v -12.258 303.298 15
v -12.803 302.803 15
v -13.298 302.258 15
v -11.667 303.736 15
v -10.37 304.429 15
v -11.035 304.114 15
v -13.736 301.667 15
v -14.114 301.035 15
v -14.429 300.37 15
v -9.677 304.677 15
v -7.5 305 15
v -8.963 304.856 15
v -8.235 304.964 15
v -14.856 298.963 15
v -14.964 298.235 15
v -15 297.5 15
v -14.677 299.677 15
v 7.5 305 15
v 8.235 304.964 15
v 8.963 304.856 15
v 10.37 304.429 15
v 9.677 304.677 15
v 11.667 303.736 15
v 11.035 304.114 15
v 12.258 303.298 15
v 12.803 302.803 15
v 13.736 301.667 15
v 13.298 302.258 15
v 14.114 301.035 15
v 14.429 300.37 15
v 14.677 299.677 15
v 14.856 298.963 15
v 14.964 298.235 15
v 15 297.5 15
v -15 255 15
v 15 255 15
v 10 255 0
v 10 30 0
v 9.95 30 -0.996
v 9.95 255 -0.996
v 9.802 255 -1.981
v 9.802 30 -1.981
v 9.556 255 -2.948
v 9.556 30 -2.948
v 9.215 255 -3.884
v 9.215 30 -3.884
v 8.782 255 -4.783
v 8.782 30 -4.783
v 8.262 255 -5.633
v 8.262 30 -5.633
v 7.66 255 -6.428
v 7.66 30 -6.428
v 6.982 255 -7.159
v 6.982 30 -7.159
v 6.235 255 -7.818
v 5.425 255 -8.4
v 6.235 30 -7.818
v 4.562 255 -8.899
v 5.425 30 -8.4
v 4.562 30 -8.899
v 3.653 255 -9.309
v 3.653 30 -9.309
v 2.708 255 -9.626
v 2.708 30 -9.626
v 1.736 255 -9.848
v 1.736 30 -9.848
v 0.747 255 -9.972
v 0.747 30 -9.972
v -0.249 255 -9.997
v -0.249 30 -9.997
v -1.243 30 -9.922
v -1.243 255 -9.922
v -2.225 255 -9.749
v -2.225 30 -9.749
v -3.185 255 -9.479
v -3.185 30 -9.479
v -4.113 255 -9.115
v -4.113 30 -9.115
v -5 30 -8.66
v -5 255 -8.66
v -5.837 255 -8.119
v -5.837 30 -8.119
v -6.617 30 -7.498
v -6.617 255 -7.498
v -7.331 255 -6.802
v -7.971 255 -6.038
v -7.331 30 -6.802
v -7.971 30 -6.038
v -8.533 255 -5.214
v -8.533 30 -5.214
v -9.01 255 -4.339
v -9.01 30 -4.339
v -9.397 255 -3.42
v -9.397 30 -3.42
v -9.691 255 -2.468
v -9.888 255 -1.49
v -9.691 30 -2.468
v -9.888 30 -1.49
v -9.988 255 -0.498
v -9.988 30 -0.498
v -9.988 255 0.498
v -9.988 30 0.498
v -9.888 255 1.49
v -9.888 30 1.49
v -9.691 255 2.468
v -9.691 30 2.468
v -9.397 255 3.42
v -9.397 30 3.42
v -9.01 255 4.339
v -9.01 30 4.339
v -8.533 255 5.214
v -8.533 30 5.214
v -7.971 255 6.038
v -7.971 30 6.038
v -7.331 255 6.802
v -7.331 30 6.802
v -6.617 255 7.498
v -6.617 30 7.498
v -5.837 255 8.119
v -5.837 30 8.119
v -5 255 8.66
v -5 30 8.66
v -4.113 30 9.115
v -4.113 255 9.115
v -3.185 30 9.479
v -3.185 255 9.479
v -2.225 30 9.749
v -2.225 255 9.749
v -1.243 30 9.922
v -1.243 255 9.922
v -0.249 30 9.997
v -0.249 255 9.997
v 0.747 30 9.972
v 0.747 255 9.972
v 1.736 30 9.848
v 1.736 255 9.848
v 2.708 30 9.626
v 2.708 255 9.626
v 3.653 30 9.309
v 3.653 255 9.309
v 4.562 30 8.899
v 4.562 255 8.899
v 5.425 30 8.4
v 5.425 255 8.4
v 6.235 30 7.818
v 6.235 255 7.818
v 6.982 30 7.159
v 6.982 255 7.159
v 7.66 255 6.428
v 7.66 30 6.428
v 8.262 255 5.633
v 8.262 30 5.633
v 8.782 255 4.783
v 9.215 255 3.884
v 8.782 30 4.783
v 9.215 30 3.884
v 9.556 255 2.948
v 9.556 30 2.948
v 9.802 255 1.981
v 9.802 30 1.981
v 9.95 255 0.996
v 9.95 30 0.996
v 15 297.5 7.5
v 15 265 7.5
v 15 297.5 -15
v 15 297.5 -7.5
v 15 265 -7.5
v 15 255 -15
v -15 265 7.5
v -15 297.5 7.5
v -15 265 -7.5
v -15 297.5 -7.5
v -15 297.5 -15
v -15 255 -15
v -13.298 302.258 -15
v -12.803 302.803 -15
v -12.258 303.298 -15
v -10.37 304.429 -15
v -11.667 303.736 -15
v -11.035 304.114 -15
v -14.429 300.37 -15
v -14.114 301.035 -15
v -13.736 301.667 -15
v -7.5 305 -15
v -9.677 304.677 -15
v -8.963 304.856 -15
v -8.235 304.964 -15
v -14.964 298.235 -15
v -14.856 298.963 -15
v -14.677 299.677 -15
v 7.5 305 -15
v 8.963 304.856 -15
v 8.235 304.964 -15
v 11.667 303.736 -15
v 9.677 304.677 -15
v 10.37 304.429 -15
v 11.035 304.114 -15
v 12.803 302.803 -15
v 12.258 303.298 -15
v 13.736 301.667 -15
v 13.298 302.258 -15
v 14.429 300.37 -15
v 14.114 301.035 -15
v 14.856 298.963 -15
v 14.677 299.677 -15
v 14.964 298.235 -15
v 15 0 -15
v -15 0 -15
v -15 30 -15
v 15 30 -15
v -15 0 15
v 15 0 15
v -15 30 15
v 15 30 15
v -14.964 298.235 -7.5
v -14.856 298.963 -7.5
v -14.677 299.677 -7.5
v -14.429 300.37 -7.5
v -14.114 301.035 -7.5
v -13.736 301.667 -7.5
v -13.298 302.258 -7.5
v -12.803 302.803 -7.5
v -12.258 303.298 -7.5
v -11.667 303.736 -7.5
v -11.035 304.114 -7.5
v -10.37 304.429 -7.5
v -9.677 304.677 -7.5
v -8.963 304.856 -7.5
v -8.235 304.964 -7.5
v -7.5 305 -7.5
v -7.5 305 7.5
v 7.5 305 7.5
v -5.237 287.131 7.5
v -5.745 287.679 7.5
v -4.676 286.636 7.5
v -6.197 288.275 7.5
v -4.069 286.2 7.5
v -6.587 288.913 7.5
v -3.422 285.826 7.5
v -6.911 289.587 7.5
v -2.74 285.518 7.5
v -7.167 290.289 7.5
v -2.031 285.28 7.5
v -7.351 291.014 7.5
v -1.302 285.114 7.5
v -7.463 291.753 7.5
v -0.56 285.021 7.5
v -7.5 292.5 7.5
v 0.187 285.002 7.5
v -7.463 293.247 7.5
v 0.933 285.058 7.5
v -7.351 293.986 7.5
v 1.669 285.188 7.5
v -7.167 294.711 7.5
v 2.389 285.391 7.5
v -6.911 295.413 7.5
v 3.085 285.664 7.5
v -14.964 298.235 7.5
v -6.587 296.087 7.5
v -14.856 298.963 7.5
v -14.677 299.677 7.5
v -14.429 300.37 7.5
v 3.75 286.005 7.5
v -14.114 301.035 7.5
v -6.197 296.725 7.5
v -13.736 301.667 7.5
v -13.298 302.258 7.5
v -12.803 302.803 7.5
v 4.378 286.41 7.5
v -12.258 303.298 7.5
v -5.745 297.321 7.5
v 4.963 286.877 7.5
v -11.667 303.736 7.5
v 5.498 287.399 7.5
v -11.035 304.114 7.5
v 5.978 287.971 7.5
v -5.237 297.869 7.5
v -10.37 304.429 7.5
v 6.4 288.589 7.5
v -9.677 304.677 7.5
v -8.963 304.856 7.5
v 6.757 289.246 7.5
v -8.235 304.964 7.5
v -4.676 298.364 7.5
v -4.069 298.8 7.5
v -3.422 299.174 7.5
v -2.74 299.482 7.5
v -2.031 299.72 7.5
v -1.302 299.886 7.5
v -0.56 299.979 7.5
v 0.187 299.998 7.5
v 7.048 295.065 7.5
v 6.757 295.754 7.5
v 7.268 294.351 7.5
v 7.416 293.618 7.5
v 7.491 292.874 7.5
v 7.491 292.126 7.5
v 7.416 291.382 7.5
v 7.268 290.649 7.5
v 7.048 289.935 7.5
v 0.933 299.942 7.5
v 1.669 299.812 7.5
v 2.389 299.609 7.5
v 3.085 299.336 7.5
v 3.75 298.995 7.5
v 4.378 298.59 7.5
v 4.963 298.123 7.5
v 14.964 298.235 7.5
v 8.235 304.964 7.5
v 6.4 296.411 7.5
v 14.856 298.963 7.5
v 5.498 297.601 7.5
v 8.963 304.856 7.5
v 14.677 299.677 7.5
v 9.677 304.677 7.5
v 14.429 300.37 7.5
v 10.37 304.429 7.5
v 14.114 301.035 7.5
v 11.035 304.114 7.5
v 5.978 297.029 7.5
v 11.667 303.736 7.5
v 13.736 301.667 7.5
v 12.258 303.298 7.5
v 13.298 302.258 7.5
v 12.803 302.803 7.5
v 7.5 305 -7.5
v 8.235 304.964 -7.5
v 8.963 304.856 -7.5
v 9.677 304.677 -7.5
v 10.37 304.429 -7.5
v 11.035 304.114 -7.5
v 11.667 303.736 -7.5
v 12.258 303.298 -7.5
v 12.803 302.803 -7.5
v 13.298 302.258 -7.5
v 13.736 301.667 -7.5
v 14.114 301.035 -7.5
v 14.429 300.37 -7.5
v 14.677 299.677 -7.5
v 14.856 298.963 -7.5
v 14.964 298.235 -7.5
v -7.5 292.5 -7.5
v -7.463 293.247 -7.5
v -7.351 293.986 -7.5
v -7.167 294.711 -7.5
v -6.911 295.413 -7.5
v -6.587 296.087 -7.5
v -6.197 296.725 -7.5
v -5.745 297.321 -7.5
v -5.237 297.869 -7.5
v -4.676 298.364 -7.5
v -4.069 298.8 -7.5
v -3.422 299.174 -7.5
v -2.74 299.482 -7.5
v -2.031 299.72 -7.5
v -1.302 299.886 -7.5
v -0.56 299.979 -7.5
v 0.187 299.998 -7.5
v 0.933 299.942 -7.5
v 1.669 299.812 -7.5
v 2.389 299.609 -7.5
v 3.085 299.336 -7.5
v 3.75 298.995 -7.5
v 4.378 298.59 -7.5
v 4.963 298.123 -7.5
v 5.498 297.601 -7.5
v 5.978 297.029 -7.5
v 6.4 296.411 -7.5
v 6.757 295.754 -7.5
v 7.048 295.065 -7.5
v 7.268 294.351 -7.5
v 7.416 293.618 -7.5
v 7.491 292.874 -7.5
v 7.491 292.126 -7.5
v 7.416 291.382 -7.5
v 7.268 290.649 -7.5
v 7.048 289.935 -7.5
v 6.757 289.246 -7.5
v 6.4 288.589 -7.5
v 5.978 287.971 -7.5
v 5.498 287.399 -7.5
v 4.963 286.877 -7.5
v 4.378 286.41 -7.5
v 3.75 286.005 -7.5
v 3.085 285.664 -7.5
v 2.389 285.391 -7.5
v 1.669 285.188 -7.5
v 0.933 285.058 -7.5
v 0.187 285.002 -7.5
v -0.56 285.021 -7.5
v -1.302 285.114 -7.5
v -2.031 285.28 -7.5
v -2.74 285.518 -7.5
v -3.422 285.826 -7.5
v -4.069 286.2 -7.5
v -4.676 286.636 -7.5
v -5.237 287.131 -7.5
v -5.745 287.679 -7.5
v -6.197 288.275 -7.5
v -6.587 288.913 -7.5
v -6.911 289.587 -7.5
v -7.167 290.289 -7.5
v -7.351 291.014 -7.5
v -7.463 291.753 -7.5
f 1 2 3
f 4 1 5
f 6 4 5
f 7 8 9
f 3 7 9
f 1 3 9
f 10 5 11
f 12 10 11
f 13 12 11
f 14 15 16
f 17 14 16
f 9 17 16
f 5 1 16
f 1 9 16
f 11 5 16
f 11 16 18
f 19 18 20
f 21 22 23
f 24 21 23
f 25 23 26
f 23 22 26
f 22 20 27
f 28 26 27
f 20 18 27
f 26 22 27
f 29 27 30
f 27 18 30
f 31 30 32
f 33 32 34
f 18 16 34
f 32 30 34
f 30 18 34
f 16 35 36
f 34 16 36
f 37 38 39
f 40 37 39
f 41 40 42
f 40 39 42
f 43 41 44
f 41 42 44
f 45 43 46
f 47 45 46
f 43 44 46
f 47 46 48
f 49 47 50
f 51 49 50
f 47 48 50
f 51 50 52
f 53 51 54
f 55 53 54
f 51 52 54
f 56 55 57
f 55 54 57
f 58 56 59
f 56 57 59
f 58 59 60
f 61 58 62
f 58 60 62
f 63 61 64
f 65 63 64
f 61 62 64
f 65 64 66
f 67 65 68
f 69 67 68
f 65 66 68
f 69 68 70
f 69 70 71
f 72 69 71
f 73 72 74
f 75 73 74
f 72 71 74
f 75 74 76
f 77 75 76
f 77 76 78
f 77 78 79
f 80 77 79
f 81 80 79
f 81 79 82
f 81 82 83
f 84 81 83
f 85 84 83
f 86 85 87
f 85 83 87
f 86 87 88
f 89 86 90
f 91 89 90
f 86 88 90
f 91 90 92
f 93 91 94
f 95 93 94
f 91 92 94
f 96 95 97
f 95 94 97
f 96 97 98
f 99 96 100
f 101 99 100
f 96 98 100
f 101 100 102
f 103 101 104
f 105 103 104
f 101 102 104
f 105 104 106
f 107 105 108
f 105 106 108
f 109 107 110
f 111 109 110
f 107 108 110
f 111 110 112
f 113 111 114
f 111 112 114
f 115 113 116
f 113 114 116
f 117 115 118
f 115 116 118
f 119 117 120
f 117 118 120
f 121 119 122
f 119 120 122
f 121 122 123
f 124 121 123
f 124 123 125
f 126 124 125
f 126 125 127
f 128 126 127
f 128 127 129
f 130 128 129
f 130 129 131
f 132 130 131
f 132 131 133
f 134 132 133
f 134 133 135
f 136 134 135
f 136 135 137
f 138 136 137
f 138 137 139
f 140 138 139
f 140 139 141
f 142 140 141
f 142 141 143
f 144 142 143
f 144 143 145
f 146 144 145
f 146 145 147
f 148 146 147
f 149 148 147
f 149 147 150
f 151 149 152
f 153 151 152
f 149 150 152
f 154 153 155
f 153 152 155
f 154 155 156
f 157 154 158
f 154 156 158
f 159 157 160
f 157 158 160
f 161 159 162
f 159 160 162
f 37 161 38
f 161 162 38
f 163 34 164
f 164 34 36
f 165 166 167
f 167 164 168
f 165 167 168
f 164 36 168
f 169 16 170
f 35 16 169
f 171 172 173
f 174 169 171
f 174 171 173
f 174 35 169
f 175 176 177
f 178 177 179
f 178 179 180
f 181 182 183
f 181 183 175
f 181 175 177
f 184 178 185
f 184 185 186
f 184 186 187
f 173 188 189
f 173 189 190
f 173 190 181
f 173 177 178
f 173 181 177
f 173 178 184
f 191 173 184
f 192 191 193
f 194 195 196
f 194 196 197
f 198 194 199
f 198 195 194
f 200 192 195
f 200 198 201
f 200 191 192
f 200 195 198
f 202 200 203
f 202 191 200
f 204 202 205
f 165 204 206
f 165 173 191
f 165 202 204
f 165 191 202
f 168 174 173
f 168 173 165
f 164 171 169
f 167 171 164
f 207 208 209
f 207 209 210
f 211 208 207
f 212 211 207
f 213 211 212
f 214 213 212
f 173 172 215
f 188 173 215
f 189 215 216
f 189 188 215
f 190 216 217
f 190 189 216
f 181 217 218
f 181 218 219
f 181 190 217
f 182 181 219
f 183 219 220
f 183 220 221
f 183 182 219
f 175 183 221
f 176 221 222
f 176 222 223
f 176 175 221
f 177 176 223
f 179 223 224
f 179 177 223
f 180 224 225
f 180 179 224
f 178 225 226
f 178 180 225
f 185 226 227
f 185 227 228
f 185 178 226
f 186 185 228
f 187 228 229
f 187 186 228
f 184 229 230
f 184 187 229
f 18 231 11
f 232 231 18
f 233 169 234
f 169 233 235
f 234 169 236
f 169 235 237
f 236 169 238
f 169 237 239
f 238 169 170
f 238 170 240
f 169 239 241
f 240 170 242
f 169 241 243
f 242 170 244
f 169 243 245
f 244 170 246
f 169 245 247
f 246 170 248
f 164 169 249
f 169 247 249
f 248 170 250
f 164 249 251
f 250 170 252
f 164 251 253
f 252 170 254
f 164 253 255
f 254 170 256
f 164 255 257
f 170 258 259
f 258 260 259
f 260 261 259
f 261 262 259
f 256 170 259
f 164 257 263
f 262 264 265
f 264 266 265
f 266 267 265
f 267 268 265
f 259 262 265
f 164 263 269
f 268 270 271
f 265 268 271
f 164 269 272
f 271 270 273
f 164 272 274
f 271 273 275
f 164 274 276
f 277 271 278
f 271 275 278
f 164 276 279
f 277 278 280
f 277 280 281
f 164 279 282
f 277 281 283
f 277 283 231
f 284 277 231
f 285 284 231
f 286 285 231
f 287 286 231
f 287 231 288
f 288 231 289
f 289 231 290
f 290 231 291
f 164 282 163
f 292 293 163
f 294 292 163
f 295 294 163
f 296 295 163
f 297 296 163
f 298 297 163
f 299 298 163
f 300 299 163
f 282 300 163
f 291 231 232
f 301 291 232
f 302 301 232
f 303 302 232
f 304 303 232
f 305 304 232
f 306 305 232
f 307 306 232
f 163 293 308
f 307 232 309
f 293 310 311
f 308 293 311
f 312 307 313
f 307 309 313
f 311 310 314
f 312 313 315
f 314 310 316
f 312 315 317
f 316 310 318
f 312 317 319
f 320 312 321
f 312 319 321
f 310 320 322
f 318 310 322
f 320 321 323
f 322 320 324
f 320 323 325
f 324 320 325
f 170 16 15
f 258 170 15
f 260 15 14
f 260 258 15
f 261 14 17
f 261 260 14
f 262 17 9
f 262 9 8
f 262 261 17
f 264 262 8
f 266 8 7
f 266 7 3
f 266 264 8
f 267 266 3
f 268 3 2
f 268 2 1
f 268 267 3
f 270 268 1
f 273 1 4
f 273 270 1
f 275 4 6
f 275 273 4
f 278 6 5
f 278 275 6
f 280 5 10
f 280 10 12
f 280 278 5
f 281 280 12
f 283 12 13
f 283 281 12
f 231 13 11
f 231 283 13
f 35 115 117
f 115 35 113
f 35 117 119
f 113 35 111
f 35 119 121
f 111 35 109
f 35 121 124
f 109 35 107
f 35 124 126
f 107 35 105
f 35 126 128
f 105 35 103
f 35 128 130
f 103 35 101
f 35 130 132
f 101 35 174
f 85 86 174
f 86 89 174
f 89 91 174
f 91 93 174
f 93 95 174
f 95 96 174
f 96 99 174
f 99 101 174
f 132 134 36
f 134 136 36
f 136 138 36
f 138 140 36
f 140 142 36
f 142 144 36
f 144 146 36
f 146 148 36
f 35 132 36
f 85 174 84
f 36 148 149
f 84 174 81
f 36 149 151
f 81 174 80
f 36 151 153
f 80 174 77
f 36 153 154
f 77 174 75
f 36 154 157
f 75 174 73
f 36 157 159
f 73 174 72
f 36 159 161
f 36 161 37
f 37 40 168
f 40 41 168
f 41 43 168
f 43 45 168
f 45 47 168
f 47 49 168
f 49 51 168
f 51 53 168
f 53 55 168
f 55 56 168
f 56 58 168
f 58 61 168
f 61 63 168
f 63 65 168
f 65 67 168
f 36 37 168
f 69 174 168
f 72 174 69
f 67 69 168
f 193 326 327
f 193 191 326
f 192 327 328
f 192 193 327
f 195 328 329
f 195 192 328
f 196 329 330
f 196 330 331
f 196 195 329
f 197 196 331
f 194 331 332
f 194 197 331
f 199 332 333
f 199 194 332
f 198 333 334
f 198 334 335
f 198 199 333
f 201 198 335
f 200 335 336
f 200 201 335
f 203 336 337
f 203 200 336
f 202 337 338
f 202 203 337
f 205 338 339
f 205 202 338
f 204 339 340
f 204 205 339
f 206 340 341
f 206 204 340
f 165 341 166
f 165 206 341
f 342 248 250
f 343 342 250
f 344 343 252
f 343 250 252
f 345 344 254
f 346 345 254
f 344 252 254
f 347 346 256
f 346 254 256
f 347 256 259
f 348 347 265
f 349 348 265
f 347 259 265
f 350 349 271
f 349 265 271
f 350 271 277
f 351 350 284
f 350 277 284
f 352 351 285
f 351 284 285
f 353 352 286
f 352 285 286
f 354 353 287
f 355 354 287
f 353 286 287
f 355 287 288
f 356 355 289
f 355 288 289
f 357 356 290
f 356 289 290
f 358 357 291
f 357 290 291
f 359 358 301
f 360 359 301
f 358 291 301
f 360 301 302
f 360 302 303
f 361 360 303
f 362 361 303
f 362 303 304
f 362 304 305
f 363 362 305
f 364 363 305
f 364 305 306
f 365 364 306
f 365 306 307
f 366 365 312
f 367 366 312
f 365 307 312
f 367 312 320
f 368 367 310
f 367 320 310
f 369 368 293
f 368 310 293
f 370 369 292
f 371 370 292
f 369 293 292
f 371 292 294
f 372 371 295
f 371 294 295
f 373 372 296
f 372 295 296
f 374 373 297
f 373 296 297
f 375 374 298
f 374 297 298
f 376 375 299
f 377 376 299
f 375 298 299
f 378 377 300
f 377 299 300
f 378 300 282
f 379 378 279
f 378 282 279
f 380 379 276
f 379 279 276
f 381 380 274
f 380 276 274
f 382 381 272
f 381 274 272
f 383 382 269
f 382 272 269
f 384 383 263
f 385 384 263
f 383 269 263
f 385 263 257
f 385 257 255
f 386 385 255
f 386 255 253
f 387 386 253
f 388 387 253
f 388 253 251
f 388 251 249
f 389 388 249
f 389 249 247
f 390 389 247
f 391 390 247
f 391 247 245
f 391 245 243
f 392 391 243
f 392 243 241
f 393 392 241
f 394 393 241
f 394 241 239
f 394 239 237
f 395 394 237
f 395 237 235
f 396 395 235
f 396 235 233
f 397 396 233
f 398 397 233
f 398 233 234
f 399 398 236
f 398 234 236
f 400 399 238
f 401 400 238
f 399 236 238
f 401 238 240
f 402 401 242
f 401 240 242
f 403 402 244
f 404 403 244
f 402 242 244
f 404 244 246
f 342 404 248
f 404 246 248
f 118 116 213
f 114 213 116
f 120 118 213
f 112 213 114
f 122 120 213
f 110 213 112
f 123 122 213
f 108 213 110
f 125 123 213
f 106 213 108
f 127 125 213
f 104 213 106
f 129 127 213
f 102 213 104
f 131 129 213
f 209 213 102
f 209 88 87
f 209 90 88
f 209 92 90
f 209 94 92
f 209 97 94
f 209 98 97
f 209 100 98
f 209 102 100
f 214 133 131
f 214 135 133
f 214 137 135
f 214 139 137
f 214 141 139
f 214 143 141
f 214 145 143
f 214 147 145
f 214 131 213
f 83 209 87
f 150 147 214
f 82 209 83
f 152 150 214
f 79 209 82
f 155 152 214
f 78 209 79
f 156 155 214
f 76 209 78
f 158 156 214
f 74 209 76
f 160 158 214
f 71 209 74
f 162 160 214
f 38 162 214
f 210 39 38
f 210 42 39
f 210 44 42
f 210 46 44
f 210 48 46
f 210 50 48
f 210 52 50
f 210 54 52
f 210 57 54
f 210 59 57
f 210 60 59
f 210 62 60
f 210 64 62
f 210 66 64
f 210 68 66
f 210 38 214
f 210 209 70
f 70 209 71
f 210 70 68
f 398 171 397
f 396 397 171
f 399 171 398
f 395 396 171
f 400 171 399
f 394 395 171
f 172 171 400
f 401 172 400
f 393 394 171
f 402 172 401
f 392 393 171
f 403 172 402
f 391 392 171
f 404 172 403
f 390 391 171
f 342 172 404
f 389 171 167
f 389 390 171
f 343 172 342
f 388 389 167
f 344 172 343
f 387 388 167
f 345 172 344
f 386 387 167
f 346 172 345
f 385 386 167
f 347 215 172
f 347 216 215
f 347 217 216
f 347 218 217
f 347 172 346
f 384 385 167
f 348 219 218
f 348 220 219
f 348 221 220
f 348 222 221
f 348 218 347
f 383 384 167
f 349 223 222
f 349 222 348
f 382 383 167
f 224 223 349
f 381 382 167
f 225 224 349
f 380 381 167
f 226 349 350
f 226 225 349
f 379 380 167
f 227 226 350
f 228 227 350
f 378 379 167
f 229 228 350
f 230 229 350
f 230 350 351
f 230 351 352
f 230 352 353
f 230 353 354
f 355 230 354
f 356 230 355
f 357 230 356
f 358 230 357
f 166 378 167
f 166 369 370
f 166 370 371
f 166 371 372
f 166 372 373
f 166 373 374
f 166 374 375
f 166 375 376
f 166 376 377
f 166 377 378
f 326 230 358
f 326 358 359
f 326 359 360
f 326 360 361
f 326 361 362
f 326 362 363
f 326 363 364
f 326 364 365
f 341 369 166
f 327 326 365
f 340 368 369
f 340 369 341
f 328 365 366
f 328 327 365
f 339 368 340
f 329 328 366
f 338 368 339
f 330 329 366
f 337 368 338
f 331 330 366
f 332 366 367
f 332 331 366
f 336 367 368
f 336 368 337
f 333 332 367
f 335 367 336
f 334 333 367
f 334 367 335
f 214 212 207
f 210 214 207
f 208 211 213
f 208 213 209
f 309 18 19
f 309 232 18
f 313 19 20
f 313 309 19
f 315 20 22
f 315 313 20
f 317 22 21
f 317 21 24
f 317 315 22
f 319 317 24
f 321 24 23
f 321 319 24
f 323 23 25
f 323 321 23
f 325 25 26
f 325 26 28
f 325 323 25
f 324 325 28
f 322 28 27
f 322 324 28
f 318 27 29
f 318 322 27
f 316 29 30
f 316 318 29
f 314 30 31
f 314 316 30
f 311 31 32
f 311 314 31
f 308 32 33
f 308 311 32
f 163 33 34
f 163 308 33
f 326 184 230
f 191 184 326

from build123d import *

# Parameters (mm, degrees)
SKETCH1_W           = 30
SKETCH1_H           = 30
BOSS_EXTRUDE1_DEPTH = 30
SKETCH2_R           = 10
BOSS_EXTRUDE2_DEPTH = 225
SKETCH3_W           = 30
SKETCH3_H           = 30
BOSS_EXTRUDE3_DEPTH = 50
SKETCH4_W           = 30
SKETCH4_H           = 15
CUT_EXTRUDE1_DEPTH  = 40
SKETCH5_R           = 7.5
BOSS_EXTRUDE4_DEPTH = 15
FILLET1_R           = 7.5


with BuildPart() as part:
    # Sketch1 → Boss-Extrude1 (new body)
    with BuildSketch(Plane(origin=(0, 0, 0), x_dir=(1, 0, 0), z_dir=(0, 1, 0))):
        Rectangle(SKETCH1_W, SKETCH1_H)
    extrude(amount=BOSS_EXTRUDE1_DEPTH)

    # Sketch2 → Boss-Extrude2 (add)
    with BuildSketch(Plane(origin=(0, 30, 0), x_dir=(1, 0, 0), z_dir=(0, 1, 0))):
        Circle(SKETCH2_R)
    extrude(amount=BOSS_EXTRUDE2_DEPTH)

    # Sketch3 → Boss-Extrude3 (add)
    with BuildSketch(Plane(origin=(0, 255, 0), x_dir=(1, 0, 0), z_dir=(0, 1, 0))):
        Rectangle(SKETCH3_W, SKETCH3_H)
    extrude(amount=BOSS_EXTRUDE3_DEPTH)

    # Sketch4 → Cut-Extrude1 (cut)
    with BuildSketch(Plane(origin=(0, 305, 0), x_dir=(1, 0, 0), z_dir=(0, 1, 0))):
        Rectangle(SKETCH4_W, SKETCH4_H)
    extrude(amount=-CUT_EXTRUDE1_DEPTH, mode=Mode.SUBTRACT)

    # Sketch5 → Boss-Extrude4 (add)
    with BuildSketch(Plane(origin=(0, 0, 7.5), x_dir=(-1, 0, 0), z_dir=(0, 0, -1))):
        with Locations((0, 292.5)):
            Circle(SKETCH5_R)
    extrude(amount=BOSS_EXTRUDE4_DEPTH)

    # Fillet1
    fillet1_edges = [part.edges().sort_by_distance(p)[0] for p in [
        (15, 305, 11.25),
        (-15, 305, -11.25),
        (15, 305, -11.25),
        (-15, 305, 11.25),
    ]]
    fillet(fillet1_edges, radius=FILLET1_R)


solid = part.part
